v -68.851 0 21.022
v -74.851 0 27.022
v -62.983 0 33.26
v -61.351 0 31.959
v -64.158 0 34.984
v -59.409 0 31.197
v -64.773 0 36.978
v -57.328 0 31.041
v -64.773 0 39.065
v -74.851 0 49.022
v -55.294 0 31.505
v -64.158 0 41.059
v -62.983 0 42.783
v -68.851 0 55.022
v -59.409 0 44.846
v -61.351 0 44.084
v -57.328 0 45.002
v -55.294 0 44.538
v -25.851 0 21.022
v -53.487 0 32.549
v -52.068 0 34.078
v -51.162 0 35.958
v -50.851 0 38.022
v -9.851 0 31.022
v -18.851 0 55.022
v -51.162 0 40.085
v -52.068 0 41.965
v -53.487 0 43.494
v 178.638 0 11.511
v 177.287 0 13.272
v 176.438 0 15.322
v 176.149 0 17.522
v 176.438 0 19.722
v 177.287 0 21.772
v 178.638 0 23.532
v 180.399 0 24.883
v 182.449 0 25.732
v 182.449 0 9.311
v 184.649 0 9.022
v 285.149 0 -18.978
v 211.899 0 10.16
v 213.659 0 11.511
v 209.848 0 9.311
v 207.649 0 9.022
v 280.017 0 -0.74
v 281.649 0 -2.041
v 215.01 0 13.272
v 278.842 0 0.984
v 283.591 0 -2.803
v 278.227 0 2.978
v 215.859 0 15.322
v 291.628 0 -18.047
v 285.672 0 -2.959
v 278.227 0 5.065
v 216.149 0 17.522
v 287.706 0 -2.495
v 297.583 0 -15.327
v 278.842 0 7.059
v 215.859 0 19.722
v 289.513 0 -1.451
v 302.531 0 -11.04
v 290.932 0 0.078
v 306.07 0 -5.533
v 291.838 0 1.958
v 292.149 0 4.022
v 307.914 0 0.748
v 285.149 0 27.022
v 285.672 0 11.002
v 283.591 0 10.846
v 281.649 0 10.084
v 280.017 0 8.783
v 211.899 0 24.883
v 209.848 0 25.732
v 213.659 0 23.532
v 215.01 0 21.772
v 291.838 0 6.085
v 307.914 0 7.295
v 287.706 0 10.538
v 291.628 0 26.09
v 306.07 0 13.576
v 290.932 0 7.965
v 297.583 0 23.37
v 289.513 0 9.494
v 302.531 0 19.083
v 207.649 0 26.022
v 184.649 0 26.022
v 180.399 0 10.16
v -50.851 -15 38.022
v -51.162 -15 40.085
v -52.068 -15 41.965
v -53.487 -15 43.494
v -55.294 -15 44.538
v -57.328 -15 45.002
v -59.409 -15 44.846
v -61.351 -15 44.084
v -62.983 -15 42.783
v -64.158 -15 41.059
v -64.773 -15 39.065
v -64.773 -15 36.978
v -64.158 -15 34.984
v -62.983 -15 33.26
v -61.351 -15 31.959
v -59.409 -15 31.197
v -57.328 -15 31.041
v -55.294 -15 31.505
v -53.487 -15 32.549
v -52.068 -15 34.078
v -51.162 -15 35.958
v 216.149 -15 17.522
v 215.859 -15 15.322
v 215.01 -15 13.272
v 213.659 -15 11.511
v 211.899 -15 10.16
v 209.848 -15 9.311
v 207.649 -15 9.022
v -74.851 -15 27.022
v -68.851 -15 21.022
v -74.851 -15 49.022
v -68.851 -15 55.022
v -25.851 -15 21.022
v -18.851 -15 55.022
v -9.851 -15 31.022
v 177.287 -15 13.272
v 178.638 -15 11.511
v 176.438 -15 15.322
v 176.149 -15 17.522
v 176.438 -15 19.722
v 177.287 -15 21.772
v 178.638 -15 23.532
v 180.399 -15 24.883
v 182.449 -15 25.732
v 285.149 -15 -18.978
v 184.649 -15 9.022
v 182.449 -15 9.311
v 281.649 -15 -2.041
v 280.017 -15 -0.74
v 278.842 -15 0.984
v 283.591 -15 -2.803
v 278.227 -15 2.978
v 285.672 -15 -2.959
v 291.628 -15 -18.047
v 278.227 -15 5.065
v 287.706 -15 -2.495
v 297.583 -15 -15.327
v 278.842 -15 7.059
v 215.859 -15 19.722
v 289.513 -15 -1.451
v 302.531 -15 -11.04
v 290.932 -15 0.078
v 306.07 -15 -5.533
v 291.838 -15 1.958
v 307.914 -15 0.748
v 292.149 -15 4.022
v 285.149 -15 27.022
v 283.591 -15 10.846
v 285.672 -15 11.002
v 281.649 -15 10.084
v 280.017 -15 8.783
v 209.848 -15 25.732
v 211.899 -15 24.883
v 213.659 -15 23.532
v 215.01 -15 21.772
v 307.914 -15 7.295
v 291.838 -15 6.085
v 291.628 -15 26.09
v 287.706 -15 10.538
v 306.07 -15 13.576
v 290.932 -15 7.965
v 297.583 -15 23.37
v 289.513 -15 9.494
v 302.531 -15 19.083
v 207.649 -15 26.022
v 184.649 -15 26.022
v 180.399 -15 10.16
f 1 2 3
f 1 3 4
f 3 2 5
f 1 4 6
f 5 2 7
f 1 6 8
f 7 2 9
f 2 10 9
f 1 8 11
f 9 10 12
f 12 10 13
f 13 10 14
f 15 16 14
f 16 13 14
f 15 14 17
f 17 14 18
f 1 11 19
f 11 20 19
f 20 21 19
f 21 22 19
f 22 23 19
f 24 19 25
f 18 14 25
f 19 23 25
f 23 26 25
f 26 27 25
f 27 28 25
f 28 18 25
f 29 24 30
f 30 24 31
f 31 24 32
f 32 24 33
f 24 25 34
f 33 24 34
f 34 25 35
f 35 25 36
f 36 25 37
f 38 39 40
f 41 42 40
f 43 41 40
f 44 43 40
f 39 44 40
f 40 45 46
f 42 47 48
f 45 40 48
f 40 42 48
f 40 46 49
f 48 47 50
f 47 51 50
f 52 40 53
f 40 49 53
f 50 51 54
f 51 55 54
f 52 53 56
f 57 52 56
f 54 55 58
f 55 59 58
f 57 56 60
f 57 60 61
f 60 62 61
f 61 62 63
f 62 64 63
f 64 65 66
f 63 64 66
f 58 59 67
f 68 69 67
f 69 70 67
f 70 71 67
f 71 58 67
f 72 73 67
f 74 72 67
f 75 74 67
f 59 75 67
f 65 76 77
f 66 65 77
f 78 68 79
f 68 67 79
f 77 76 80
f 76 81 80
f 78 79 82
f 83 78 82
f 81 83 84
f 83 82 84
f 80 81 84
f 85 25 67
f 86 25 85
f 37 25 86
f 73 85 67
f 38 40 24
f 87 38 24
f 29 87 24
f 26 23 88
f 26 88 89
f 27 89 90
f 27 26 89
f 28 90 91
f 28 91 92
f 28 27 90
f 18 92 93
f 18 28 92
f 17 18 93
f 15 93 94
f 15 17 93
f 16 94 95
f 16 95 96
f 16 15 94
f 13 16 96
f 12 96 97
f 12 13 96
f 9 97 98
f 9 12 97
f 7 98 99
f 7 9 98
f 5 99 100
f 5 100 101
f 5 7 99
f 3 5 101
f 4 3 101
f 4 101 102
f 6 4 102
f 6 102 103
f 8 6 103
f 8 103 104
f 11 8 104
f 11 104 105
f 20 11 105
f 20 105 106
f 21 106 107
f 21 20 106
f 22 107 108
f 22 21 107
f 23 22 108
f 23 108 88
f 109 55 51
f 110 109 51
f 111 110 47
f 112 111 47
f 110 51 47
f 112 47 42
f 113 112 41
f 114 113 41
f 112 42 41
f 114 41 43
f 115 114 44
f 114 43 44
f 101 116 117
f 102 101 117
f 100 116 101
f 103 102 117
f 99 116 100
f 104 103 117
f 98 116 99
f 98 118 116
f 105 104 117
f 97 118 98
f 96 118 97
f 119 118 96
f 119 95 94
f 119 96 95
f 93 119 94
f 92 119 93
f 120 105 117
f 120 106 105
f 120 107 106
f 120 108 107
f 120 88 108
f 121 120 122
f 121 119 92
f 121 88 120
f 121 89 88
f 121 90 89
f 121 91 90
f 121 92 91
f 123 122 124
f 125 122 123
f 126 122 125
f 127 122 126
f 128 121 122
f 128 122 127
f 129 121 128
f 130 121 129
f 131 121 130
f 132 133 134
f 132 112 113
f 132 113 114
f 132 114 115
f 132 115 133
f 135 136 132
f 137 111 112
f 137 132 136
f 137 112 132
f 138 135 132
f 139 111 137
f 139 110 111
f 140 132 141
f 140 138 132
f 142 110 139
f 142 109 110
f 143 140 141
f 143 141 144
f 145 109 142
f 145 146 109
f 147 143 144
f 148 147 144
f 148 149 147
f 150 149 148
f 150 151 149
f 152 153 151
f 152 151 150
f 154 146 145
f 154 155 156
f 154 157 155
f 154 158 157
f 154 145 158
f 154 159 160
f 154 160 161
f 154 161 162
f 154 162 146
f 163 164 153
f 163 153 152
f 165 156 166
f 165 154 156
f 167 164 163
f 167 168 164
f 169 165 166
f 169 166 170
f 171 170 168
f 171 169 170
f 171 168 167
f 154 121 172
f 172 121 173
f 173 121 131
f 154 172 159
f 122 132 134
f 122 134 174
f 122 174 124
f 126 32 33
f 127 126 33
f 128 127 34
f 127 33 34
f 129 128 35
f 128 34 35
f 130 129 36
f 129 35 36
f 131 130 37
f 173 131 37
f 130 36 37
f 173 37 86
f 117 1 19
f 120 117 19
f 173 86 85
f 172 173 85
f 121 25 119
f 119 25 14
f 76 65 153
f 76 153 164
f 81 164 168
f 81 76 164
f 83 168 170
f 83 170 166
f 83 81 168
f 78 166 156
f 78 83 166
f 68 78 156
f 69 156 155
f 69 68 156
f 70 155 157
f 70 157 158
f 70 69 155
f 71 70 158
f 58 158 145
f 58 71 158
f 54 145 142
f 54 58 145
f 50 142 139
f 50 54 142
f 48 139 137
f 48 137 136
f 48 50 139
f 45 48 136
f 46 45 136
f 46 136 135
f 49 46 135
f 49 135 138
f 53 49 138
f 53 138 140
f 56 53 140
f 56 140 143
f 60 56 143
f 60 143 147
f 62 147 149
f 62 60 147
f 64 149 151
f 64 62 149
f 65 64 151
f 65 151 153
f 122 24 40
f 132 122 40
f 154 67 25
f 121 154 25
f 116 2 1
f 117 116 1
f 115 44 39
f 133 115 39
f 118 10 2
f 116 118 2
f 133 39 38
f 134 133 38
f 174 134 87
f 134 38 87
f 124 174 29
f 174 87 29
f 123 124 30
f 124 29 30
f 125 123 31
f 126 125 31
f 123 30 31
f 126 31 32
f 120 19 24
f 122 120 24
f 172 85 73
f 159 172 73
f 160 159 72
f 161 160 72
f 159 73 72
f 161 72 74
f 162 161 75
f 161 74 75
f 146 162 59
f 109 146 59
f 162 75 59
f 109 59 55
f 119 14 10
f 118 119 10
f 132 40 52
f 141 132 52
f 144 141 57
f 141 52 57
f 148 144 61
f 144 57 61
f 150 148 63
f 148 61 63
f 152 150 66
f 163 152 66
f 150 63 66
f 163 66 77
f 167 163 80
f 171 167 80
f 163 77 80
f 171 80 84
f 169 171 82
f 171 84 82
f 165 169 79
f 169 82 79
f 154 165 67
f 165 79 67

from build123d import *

# Parameters (mm, degrees)
F0_R     = 7
F1_DEPTH = 15


with BuildPart() as f1:
    # F0 (on Front) → F1 (new body)
    with BuildSketch(Plane.XZ):
        with BuildLine():
            Line((285.148505, 27.021557), (-18.851495, 55.021557))
            Line((-18.851495, 55.021557), (-68.851495, 55.021557))
            Line((-68.851495, 55.021557), (-74.851495, 49.021557))
            Line((-74.851495, 49.021557), (-74.851495, 27.021557))
            Line((-74.851495, 27.021557), (-68.851495, 21.021557))
            Line((-68.851495, 21.021557), (-25.851495, 21.021557))
            Line((-25.851495, 21.021557), (-9.851495, 31.021557))
            Line((-9.851495, 31.021557), (285.148505, -18.978443))
            ThreePointArc((285.148505, -18.978443), (308.148505, 4.021557), (285.148505, 27.021557))
        make_face()
        with BuildLine():
            ThreePointArc((176.148505, 17.521557), (178.638097, 23.531965), (184.648505, 26.021557))
            Line((184.648505, 26.021557), (207.648505, 26.021557))
            ThreePointArc((207.648505, 26.021557), (213.658912, 23.531965), (216.148505, 17.521557))
            ThreePointArc((216.148505, 17.521557), (213.658912, 11.51115), (207.648505, 9.021557))
            Line((207.648505, 9.021557), (184.648505, 9.021557))
            ThreePointArc((184.648505, 9.021557), (178.638097, 11.51115), (176.148505, 17.521557))
        make_face(mode=Mode.SUBTRACT)
        with Locations((285.148505, 4.021557)):
            Circle(F0_R, mode=Mode.SUBTRACT)
        with Locations((-57.851495, 38.021557)):
            Circle(F0_R, mode=Mode.SUBTRACT)
    extrude(amount=F1_DEPTH)


solid = f1.part
